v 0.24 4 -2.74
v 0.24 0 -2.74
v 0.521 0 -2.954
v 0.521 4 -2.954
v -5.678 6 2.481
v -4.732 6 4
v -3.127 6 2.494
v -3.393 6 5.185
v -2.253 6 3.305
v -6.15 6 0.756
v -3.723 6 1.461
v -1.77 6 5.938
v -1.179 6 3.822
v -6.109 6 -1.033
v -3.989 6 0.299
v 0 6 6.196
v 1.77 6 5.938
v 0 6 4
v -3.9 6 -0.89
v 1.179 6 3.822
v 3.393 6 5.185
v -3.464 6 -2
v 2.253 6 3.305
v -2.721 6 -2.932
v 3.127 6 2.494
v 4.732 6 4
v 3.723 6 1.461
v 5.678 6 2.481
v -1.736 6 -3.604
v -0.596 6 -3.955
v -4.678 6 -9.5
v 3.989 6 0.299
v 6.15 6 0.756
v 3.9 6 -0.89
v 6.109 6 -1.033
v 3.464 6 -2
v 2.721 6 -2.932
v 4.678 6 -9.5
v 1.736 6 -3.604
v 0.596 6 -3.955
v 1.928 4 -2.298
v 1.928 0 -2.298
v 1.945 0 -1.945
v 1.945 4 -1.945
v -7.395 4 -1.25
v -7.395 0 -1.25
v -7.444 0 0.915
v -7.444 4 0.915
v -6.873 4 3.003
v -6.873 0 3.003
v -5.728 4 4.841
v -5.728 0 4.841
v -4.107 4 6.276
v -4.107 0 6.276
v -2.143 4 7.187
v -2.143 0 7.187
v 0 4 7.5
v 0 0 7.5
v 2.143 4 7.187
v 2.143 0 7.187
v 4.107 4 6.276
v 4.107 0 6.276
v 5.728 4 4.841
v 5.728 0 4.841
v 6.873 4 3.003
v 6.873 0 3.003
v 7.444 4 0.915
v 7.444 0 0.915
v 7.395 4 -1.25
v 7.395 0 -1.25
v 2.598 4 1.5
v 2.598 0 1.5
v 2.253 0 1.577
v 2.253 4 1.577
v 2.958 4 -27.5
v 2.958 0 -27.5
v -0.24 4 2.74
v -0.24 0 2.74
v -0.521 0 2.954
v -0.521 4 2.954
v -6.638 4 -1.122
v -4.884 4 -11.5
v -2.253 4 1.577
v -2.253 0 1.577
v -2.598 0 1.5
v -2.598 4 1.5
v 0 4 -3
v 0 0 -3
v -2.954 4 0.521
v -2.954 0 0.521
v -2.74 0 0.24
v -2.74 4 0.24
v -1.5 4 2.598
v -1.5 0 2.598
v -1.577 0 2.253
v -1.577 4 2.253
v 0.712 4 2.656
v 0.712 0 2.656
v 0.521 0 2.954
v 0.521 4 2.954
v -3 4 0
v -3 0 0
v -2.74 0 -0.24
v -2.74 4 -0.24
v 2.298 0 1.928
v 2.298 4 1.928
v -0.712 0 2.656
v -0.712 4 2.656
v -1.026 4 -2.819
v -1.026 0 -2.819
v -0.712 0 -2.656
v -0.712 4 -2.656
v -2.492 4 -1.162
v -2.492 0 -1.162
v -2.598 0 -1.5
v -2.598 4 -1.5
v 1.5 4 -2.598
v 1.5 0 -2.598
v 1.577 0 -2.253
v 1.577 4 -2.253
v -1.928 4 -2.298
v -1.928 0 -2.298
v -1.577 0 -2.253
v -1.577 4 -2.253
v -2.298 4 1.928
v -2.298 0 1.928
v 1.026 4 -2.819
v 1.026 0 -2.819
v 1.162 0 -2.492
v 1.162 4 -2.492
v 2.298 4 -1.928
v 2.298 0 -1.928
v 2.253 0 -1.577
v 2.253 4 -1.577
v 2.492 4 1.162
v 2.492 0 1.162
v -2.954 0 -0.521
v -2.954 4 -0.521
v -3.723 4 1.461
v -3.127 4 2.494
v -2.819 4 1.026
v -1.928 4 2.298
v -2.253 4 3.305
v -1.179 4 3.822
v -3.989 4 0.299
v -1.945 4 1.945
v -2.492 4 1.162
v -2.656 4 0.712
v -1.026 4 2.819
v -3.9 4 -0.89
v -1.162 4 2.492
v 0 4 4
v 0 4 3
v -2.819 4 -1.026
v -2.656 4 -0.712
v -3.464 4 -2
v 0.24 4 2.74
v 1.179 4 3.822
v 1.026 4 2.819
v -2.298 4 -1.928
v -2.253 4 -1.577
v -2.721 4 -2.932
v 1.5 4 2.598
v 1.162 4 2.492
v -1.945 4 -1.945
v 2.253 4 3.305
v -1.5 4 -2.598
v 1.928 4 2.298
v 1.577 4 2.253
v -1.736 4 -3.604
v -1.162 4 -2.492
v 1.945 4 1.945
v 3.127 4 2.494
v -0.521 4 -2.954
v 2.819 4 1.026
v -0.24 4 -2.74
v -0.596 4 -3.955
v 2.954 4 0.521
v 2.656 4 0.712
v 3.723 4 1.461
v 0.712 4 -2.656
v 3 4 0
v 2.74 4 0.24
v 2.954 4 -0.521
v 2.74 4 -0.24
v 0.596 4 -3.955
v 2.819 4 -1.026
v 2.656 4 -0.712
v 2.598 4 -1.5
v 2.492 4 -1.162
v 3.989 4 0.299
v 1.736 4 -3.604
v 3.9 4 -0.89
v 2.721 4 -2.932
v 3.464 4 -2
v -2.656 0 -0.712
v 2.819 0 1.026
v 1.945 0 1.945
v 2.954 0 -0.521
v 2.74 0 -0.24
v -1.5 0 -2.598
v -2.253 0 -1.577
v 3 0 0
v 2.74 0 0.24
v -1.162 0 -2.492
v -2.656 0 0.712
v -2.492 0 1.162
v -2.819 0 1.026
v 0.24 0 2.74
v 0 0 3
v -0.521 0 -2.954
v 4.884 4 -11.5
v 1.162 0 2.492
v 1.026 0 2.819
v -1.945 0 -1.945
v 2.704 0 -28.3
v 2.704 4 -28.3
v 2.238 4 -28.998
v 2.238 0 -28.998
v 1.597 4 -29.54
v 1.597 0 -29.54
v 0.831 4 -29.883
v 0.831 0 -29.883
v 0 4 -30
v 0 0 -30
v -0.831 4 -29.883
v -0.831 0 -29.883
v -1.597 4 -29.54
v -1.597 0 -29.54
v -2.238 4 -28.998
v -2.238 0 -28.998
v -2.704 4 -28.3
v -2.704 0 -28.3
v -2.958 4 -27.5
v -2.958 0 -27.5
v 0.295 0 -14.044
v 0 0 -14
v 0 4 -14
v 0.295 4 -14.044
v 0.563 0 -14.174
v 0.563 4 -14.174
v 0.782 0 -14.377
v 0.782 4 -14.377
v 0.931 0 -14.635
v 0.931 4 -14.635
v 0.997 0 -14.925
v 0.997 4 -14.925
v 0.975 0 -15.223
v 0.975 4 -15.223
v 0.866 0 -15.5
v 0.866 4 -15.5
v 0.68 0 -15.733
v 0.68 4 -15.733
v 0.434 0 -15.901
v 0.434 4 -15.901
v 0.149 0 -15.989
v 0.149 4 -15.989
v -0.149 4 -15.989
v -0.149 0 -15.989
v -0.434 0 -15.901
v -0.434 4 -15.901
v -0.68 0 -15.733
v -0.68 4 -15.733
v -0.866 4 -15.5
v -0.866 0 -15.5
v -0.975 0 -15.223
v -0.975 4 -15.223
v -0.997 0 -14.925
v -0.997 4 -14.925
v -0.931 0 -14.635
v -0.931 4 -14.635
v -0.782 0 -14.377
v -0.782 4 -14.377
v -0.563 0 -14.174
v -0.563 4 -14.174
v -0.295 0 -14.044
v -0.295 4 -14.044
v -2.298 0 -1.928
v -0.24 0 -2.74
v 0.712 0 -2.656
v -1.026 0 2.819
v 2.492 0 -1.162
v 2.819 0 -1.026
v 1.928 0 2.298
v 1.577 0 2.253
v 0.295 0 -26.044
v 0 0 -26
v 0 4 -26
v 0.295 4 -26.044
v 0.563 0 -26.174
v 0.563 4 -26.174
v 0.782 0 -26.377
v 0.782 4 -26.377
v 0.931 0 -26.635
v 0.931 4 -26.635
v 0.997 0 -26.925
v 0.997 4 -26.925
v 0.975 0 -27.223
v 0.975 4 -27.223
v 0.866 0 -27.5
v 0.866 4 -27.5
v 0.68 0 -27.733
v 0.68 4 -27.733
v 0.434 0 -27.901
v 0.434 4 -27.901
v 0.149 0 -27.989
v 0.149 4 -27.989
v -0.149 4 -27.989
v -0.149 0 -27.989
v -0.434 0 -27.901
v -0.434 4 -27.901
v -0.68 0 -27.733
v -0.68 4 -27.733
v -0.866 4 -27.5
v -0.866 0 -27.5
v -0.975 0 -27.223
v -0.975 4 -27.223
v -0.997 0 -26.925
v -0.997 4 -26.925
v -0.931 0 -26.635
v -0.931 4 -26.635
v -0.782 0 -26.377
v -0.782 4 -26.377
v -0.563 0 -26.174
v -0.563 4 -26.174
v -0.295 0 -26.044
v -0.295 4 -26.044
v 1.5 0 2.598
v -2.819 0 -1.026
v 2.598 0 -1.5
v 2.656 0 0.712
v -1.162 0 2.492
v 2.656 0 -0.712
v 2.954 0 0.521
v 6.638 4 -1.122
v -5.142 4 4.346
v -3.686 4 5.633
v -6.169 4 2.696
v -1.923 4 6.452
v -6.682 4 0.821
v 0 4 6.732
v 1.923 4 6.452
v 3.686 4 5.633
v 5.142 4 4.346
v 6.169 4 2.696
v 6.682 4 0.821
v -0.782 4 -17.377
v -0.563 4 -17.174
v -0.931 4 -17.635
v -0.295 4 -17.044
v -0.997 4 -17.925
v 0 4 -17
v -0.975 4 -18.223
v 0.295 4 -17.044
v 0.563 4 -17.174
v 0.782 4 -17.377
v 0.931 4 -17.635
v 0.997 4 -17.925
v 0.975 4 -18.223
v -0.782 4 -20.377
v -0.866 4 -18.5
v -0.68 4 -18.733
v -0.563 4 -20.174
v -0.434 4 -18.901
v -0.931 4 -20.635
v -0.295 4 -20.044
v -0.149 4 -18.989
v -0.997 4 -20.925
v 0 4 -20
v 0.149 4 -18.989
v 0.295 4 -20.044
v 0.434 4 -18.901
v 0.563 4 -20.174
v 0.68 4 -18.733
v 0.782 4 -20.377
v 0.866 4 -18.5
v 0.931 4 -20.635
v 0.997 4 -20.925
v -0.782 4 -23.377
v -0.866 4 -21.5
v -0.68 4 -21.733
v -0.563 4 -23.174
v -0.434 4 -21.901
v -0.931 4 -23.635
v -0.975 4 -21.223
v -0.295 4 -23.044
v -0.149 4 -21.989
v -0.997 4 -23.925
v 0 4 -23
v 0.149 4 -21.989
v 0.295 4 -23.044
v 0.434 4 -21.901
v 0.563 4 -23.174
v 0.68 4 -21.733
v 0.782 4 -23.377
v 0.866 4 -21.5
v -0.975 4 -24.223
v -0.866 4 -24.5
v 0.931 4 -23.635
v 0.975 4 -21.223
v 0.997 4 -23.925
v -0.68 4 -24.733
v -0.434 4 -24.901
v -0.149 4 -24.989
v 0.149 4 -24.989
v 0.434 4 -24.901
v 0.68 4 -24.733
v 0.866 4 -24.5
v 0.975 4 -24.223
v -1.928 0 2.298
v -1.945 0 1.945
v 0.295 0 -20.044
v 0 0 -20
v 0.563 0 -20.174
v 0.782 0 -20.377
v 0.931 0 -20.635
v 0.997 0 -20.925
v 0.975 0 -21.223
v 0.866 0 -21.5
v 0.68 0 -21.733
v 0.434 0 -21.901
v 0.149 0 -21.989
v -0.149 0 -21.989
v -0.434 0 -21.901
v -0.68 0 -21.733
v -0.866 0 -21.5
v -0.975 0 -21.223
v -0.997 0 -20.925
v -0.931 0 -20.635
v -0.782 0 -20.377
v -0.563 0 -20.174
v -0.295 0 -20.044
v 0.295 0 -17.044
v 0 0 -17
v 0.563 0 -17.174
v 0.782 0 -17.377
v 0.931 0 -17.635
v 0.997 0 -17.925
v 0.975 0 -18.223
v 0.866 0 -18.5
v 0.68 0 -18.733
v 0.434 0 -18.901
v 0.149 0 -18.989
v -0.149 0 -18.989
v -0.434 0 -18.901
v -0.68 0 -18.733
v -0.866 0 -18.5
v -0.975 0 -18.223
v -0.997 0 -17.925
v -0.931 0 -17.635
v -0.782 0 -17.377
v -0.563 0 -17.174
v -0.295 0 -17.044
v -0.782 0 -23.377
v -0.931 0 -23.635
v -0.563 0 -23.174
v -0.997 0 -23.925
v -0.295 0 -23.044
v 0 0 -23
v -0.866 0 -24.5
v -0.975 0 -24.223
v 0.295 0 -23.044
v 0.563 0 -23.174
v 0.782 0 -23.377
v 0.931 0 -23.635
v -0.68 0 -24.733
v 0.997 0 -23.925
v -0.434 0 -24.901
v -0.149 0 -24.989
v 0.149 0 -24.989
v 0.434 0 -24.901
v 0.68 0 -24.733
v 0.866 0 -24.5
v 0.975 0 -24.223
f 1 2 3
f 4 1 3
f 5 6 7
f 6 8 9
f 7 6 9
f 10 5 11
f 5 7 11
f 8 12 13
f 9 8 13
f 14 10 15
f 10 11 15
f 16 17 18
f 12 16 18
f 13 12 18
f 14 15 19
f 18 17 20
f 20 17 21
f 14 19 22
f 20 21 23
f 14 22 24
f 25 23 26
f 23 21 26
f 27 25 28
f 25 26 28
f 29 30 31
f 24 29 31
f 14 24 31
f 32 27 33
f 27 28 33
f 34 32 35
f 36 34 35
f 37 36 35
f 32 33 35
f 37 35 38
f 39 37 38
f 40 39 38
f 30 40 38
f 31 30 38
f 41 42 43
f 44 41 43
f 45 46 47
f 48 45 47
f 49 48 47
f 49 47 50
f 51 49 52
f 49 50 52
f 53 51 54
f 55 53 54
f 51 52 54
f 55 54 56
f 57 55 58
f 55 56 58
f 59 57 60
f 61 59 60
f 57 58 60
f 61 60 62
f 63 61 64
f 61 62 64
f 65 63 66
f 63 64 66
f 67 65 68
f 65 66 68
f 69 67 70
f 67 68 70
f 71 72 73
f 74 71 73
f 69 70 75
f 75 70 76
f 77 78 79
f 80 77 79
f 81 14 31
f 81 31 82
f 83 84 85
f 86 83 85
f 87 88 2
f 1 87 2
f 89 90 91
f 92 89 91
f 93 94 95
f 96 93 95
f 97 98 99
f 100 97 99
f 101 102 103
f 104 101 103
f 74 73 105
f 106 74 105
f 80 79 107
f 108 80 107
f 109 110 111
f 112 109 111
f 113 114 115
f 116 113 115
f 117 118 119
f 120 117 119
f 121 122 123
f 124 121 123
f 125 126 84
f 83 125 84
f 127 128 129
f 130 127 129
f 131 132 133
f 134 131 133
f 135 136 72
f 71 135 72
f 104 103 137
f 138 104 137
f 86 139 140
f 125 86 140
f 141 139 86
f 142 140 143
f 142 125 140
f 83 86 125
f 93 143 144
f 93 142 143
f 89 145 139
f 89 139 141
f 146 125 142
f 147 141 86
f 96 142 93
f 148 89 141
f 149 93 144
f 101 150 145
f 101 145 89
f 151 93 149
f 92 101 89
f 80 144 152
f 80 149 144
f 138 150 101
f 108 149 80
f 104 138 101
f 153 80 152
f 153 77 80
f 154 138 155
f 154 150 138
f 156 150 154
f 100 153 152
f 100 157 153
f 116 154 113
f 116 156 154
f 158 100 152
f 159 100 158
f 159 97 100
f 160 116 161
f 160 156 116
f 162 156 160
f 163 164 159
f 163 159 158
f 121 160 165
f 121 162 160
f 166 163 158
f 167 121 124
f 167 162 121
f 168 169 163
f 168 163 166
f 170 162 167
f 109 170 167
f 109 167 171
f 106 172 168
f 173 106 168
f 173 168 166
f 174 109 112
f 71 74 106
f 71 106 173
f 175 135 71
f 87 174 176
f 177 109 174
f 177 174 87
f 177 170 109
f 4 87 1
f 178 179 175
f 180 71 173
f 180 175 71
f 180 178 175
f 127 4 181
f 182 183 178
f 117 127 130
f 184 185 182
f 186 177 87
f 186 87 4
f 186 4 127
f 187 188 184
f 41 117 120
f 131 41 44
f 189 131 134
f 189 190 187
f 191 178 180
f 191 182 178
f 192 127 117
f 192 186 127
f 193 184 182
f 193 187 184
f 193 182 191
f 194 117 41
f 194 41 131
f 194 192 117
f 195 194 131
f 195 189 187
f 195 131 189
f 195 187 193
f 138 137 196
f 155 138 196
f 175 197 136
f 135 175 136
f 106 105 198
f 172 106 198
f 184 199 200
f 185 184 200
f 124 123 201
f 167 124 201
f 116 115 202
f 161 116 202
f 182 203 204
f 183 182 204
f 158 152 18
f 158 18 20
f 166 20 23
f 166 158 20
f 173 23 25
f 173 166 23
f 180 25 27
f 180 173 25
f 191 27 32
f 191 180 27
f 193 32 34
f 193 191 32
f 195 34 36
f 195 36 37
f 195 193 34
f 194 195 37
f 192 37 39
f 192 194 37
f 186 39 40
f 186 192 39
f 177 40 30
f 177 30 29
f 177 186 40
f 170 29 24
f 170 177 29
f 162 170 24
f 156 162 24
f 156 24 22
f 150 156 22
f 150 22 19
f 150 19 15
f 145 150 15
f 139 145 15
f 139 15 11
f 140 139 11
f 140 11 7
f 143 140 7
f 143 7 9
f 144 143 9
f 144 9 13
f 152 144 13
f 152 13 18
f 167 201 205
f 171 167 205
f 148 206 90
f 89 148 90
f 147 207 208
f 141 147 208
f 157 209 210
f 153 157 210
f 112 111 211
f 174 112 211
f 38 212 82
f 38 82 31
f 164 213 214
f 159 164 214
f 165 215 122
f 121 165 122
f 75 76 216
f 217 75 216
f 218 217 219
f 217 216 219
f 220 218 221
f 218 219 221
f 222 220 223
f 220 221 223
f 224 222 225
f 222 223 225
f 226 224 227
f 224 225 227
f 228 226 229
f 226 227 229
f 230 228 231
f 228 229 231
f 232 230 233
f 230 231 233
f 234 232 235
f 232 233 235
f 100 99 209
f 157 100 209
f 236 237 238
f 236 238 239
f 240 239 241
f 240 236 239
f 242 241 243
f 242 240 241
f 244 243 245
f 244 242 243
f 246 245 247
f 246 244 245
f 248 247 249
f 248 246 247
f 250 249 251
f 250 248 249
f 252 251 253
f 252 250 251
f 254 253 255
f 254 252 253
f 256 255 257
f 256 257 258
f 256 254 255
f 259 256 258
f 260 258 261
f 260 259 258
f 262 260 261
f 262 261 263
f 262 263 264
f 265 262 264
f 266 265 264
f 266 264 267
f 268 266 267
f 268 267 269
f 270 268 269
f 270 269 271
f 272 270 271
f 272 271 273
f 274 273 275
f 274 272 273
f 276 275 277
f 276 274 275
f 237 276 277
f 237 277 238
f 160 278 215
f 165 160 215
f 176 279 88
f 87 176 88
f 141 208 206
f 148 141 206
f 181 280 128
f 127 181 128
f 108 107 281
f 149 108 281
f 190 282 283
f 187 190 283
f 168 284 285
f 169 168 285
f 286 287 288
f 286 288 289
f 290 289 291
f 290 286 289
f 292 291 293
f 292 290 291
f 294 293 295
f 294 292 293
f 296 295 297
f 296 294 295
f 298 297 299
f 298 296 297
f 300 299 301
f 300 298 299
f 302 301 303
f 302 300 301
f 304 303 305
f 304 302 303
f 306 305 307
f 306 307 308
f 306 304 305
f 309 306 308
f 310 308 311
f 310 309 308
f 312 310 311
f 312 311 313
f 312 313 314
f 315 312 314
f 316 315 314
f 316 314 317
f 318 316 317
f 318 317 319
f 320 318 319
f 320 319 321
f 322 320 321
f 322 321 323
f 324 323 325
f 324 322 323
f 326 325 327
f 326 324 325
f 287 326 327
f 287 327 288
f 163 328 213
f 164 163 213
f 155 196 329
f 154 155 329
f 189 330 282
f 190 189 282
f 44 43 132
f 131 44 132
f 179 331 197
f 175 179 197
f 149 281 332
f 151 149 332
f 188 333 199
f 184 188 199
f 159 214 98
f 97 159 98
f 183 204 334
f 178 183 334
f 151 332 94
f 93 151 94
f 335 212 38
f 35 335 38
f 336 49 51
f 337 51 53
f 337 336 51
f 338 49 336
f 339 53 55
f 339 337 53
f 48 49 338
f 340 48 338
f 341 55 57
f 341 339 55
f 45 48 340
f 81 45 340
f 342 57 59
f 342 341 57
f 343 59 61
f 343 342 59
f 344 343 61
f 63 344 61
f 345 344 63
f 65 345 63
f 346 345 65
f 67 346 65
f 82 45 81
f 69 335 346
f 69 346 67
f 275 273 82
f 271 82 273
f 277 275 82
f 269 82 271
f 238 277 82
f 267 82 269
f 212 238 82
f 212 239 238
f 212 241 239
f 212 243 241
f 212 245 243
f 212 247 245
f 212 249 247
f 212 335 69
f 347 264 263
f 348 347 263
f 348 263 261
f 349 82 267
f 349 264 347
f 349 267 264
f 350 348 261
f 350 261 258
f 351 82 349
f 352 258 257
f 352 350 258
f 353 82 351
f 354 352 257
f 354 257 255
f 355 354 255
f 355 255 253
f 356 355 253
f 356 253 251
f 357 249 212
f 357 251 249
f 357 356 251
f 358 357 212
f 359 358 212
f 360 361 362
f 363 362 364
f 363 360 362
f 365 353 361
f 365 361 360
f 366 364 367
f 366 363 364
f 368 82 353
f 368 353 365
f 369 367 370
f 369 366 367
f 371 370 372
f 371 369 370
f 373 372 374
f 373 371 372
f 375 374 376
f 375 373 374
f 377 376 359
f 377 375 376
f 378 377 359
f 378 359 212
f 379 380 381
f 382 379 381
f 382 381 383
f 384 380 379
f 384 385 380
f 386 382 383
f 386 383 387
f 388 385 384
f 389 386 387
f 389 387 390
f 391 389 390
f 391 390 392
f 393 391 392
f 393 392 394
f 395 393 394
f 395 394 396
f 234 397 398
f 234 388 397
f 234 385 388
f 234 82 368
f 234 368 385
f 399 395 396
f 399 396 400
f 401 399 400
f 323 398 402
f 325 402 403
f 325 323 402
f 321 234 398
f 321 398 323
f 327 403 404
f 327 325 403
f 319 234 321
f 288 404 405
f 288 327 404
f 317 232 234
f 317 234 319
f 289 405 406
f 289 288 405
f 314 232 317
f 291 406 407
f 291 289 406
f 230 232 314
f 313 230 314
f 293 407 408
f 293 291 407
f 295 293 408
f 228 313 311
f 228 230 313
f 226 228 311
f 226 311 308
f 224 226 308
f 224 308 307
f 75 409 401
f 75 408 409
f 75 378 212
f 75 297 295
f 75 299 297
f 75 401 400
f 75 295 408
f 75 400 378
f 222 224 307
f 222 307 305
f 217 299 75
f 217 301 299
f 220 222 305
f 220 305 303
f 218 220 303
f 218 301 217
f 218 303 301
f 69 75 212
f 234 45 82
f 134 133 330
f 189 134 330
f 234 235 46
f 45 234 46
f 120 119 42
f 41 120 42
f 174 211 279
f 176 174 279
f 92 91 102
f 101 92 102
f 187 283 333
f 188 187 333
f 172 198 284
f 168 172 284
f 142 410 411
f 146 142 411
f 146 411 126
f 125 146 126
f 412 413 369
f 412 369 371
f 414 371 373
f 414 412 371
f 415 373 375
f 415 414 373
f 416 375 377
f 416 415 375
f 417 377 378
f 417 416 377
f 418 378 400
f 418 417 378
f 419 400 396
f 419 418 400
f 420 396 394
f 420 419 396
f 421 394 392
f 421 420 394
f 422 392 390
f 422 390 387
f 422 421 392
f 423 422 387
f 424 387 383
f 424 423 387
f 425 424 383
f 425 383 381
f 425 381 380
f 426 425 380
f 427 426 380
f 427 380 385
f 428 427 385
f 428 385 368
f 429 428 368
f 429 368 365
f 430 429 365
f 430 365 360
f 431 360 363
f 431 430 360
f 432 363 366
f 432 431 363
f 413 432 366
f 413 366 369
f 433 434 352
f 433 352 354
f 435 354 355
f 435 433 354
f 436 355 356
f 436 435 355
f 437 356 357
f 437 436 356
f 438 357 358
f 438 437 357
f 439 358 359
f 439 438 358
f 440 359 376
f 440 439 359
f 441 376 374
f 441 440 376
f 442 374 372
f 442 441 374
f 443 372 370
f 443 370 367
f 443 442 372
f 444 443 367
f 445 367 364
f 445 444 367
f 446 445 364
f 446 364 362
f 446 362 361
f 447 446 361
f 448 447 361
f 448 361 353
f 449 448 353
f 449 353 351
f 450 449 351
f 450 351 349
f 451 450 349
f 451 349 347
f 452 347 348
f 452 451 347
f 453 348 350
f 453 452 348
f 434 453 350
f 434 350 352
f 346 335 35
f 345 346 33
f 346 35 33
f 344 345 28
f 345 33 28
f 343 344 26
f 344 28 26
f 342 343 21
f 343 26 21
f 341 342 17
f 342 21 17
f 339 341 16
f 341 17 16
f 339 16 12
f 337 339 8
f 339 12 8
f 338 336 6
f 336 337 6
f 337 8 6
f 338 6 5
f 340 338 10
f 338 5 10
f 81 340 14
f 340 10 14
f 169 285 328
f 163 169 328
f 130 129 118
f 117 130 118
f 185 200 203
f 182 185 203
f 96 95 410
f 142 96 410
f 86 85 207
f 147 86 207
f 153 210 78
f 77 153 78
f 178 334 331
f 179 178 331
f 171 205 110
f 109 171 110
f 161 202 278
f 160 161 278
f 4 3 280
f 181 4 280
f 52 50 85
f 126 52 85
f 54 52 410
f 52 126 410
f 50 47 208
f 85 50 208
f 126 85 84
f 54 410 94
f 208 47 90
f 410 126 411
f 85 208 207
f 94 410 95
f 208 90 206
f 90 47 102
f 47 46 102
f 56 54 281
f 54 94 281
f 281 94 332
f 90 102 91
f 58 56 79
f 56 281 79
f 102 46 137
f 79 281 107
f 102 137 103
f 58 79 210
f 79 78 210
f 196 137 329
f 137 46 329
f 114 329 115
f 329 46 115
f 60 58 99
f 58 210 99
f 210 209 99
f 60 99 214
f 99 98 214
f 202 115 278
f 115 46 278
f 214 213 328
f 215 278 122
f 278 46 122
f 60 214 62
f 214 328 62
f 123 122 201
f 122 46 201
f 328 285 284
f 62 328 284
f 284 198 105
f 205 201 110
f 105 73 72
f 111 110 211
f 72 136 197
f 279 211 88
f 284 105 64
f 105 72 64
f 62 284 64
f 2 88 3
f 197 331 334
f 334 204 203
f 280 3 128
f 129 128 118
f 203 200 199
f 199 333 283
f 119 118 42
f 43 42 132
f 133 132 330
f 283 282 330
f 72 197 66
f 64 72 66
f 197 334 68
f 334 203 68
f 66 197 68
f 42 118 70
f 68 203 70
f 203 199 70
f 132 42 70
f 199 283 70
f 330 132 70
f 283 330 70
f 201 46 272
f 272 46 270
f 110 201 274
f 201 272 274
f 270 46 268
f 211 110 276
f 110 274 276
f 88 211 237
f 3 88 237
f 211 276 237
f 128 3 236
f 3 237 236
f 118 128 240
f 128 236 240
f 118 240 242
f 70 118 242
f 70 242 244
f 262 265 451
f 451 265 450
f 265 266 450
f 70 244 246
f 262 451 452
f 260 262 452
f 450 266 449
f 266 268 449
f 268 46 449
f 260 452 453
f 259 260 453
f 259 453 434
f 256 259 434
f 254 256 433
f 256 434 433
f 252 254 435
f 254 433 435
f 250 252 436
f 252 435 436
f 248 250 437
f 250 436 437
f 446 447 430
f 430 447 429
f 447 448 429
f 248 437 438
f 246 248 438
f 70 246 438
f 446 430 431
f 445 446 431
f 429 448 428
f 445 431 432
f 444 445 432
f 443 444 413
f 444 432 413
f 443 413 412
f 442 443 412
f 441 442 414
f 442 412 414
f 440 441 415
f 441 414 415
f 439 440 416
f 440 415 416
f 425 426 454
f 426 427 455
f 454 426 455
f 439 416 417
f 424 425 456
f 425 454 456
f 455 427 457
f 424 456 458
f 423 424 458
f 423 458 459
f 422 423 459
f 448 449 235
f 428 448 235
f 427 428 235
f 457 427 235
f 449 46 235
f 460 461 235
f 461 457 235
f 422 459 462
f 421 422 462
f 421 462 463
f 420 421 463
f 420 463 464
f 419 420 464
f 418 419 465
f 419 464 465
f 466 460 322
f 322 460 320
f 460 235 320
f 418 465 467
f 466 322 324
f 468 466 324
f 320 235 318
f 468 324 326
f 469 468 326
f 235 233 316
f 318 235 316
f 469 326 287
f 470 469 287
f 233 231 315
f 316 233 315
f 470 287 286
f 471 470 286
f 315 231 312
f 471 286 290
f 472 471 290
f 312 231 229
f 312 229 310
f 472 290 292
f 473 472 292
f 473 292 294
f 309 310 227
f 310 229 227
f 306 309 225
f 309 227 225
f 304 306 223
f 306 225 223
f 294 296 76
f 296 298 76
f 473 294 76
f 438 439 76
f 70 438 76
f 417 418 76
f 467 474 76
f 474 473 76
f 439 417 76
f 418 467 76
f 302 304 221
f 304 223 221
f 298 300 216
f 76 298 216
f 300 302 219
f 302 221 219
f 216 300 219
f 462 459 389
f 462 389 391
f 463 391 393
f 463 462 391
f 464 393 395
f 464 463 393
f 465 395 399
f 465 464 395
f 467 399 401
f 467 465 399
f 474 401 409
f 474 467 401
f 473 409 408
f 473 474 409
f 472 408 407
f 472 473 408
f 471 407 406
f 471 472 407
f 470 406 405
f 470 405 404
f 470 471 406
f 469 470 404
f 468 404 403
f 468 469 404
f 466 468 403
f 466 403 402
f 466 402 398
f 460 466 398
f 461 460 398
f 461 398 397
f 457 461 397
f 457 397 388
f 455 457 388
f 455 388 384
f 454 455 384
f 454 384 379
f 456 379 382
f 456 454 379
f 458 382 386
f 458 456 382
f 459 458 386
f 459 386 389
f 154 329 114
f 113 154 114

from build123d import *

# Parameters (mm, degrees)
CROQUIS1_R              = 1
SALIENTE_EXTRUIR1_DEPTH = 4
CROQUIS1_3_R            = 7
CROQUIS1_3_R_2          = 4
SALIENTE_EXTRUIR2_DEPTH = 6
CHAFL_N1_SIZE           = 3
CHAFL_N2_SIZE           = 3
CHAFL_N2_SIZE_2         = 0.803847577
SALIENTE_EXTRUIR3_DEPTH = 4
MATRIZC1_COUNT          = 36


with BuildPart() as part:
    # Croquis1 → Saliente-Extruir1 (new body)
    with BuildSketch(Plane(origin=(0, 0, 0), x_dir=(1, 0, 0), z_dir=(0, 1, 0))):
        with BuildLine():
            ThreePointArc((-7.395099729, 1.25), (0, -7.5), (7.395099729, 1.25))
            Line((7.395099729, 1.25), (2.958039892, 27.5))
            ThreePointArc((2.958039892, 27.5), (0, 30), (-2.958039892, 27.5))
            Line((-2.958039892, 27.5), (-7.395099729, 1.25))
        make_face()
        with Locations(Location((0, 24, 0), (0, 0, 270))):
            Circle(CROQUIS1_R, mode=Mode.SUBTRACT)
        with Locations(Location((0, 15, 0), (0, 0, 270))):
            Circle(CROQUIS1_R, mode=Mode.SUBTRACT)
        with Locations(Location((0, 18, 0), (0, 0, 270))):
            Circle(CROQUIS1_R, mode=Mode.SUBTRACT)
        with Locations(Location((0, 21, 0), (0, 0, 270))):
            Circle(CROQUIS1_R, mode=Mode.SUBTRACT)
        with Locations(Location((0, 27, 0), (0, 0, 270))):
            Circle(CROQUIS1_R, mode=Mode.SUBTRACT)
        with BuildLine():
            ThreePointArc((-2.988584094, 0.261467228), (-2.974334584, 0.391578577), (-2.954423259, 0.520944533))
            ThreePointArc((-2.954423259, 0.520944533), (2.974334584, -0.391578577), (-2.988584094, 0.261467228))
        make_face(mode=Mode.SUBTRACT)
    extrude(amount=SALIENTE_EXTRUIR1_DEPTH)

    # Croquis1<3> → Saliente-Extruir2 (add)
    # profile 1 of 3: a face of its own
    with BuildSketch(Plane(origin=(0, 0, 0), x_dir=(1, 0, 0), z_dir=(0, 1, 0))):
        with BuildLine():
            ThreePointArc((6.453329346, 3.82158872), (0, 7.5), (-6.453329346, 3.82158872))
            Line((-6.453329346, 3.82158872), (-6.90209308, 1.166666667))
            ThreePointArc((-6.90209308, 1.166666667), (0, 7), (6.90209308, 1.166666667))
            Line((6.90209308, 1.166666667), (6.453329346, 3.82158872))
        make_face()
    # profile 2 of 3: a face of its own
    with BuildSketch(Plane(origin=(0, 0, 0), x_dir=(1, 0, 0), z_dir=(0, 1, 0))):
        with BuildLine():
            Line((-5.662533507, 8.5), (-6.453329346, 3.82158872))
            ThreePointArc((-6.453329346, 3.82158872), (0, 7.5), (6.453329346, 3.82158872))
            Line((6.453329346, 3.82158872), (5.662533507, 8.5))
            Line((5.662533507, 8.5), (-5.662533507, 8.5))
        make_face()
    # profile 3 of 3: a face of its own
    with BuildSketch(Plane(origin=(0, 0, 0), x_dir=(1, 0, 0), z_dir=(0, 1, 0))):
        Circle(CROQUIS1_3_R)
        with Locations(Location((0, 0, 0), (0, 0, 270))):
            Circle(CROQUIS1_3_R_2, mode=Mode.SUBTRACT)
    extrude(amount=SALIENTE_EXTRUIR2_DEPTH)

    # Chaflán1
    # the kernel refuses this chamfer: 3 mm, written as the material it adds along each edge
    with BuildSketch(Plane(origin=(-13.377582471, 4, -8.5), x_dir=(0, -0.02749587661058635, -0.9996219169112968), z_dir=(1, 0, 0))) as chafl_n1_piece_1_section:
        Polygon((CHAFL_N1_SIZE * 0.999621916911, CHAFL_N1_SIZE * 0.0274958766106), (-CHAFL_N1_SIZE * 0.0274958766106, CHAFL_N1_SIZE * 0.999621916911), (0, 0), align=None)
    chafl_n1_piece_1 = extrude(amount=26.755164941, mode=Mode.PRIVATE)
    chafl_n1_piece_1 = split(chafl_n1_piece_1, bisect_by=Plane(origin=(5.328597363, 4.798690402, -10.475592868), z_dir=(-0.9860132971832695, 0, 0.16666666666666669)), keep=Keep.TOP, mode=Mode.PRIVATE)
    chafl_n1_piece_1 = split(chafl_n1_piece_1, bisect_by=Plane(origin=(-5.328597363, 4.798690402, -10.475592868), z_dir=(0.9860132971832695, 0, 0.16666666666666669)), keep=Keep.TOP, mode=Mode.PRIVATE)
    chafl_n1_piece_1 = split(chafl_n1_piece_1, bisect_by=Plane(origin=(0, 6, -9.574895522), z_dir=(0, -1, 0)), keep=Keep.TOP, mode=Mode.PRIVATE)
    add(chafl_n1_piece_1)

    # Chaflán2
    # the kernel refuses this chamfer: 3, 0.803847577 mm, written as the material it takes off along each edge
    with BuildSketch(Plane(origin=(6.90209308, 6, -1.166666667), x_dir=(0.00982773906125155, -0.9999503267608272, -0.0016611910963950731), z_dir=(-0.1666666666666078, 0, -0.9860132971832793))) as chafl_n2_piece_1_section:
        Polygon((CHAFL_N2_SIZE * 0.999950326761, CHAFL_N2_SIZE * 0.00996714657715), (-CHAFL_N2_SIZE_2 * 0.00996714658201, CHAFL_N2_SIZE_2 * 0.999950327126), (0, 0), align=None)
    chafl_n2_piece_1 = extrude(amount=16.241707258, mode=Mode.PRIVATE)
    chafl_n2_piece_1 = split(chafl_n2_piece_1, bisect_by=Plane(origin=(5.281191702, 4, -9.128733123), z_dir=(0, 1, 0)), keep=Keep.TOP, mode=Mode.PRIVATE)
    add(chafl_n2_piece_1, mode=Mode.SUBTRACT)
    with BuildSketch(Plane(origin=(-6.90209308, 6, -1.166666667), x_dir=(0.976646209142954, 0.13751244702122697, 0.16508333980426884), z_dir=(0.1666666666666078, 0, -0.9860132971832793))) as chafl_n2_piece_2_section:
        Polygon((CHAFL_N2_SIZE_2 * 0.990500039187, CHAFL_N2_SIZE_2 * 0.137512447071), (-CHAFL_N2_SIZE * 0.137512447022, CHAFL_N2_SIZE * 0.990500038826), (0, 0), align=None)
    chafl_n2_piece_2 = extrude(amount=16.241707258, mode=Mode.PRIVATE)
    chafl_n2_piece_2 = split(chafl_n2_piece_2, bisect_by=Plane(origin=(-5.281191702, 4, -9.128733123), z_dir=(0, 1, 0)), keep=Keep.TOP, mode=Mode.PRIVATE)
    add(chafl_n2_piece_2, mode=Mode.SUBTRACT)
    with BuildSketch(Plane(origin=(0, 6, 0), x_dir=(0.9860132971832691, 0, -0.16666666666666757), z_dir=(-0.16666666666666757, 0, -0.9860132971832691))) as chafl_n2_piece_3_section:
        Polygon((7, CHAFL_N2_SIZE), (7 - CHAFL_N2_SIZE_2, 0), (7, 0), align=None)
    chafl_n2_piece_3 = revolve(axis=Axis((0, 6, 0), (0, -1, 0)), revolution_arc=199.188136454, mode=Mode.PRIVATE)
    chafl_n2_piece_3 = split(chafl_n2_piece_3, bisect_by=Plane(origin=(0, 4, 6.478370391), z_dir=(0, 1, 0)), keep=Keep.TOP, mode=Mode.PRIVATE)
    add(chafl_n2_piece_3, mode=Mode.SUBTRACT)

    # Croquis1<4> → Saliente-Extruir3 (add)
    with BuildSketch(Plane(origin=(0, 0, 0), x_dir=(1, 0, 0), z_dir=(0, 1, 0))):
        with BuildLine():
            Line((-3, 0), (-2.73953542, 0.239678293))
            Line((-2.73953542, 0.239678293), (-2.988584094, 0.261467228))
            ThreePointArc((-2.988584094, 0.261467228), (-2.997144665, 0.130858162), (-3, 0))
        make_face()
        with BuildLine():
            Line((-2.988584094, 0.261467228), (-2.73953542, 0.239678293))
            Line((-2.73953542, 0.239678293), (-2.954423259, 0.520944533))
            ThreePointArc((-2.954423259, 0.520944533), (-2.974334584, 0.391578577), (-2.988584094, 0.261467228))
        make_face()
    saliente_extruir3 = extrude(amount=SALIENTE_EXTRUIR3_DEPTH)

    # MatrizC1: Saliente-Extruir3 ×36 about axis
    matrizc1_axis = Axis((0, 0, 0), (0, 1, 0))
    for i in range(1, MATRIZC1_COUNT):
        add(saliente_extruir3.rotate(matrizc1_axis, i * 360 / MATRIZC1_COUNT))


solid = part.part
